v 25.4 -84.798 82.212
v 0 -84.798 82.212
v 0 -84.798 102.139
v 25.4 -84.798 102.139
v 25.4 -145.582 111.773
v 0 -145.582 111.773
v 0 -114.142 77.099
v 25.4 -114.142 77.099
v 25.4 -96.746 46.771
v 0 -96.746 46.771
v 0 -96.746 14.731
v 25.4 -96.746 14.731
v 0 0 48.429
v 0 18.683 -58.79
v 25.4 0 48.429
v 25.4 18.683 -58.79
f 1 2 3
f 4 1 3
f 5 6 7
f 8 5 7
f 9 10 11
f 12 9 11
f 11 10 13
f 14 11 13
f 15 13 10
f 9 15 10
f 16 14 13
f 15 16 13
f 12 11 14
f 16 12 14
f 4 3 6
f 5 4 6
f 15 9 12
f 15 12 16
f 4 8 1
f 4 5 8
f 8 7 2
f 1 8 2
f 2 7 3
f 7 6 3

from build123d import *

# Parameters (mm, degrees)
F1_DEPTH = 25.4


with BuildPart() as f1:
    # F0 (on Right) → F1 (new body)
    with BuildSketch(Plane.YZ):
        Polygon((0, 48.428912), (-96.746057, 46.771031), (-96.746057, 14.731053), (18.68327, -58.790002), align=None)
        Polygon((-114.142115, 77.098545), (-84.797559, 82.211936), (-84.797559, 102.139398), (-145.581543, 111.772746), align=None)
    extrude(amount=F1_DEPTH)


solid = f1.part
